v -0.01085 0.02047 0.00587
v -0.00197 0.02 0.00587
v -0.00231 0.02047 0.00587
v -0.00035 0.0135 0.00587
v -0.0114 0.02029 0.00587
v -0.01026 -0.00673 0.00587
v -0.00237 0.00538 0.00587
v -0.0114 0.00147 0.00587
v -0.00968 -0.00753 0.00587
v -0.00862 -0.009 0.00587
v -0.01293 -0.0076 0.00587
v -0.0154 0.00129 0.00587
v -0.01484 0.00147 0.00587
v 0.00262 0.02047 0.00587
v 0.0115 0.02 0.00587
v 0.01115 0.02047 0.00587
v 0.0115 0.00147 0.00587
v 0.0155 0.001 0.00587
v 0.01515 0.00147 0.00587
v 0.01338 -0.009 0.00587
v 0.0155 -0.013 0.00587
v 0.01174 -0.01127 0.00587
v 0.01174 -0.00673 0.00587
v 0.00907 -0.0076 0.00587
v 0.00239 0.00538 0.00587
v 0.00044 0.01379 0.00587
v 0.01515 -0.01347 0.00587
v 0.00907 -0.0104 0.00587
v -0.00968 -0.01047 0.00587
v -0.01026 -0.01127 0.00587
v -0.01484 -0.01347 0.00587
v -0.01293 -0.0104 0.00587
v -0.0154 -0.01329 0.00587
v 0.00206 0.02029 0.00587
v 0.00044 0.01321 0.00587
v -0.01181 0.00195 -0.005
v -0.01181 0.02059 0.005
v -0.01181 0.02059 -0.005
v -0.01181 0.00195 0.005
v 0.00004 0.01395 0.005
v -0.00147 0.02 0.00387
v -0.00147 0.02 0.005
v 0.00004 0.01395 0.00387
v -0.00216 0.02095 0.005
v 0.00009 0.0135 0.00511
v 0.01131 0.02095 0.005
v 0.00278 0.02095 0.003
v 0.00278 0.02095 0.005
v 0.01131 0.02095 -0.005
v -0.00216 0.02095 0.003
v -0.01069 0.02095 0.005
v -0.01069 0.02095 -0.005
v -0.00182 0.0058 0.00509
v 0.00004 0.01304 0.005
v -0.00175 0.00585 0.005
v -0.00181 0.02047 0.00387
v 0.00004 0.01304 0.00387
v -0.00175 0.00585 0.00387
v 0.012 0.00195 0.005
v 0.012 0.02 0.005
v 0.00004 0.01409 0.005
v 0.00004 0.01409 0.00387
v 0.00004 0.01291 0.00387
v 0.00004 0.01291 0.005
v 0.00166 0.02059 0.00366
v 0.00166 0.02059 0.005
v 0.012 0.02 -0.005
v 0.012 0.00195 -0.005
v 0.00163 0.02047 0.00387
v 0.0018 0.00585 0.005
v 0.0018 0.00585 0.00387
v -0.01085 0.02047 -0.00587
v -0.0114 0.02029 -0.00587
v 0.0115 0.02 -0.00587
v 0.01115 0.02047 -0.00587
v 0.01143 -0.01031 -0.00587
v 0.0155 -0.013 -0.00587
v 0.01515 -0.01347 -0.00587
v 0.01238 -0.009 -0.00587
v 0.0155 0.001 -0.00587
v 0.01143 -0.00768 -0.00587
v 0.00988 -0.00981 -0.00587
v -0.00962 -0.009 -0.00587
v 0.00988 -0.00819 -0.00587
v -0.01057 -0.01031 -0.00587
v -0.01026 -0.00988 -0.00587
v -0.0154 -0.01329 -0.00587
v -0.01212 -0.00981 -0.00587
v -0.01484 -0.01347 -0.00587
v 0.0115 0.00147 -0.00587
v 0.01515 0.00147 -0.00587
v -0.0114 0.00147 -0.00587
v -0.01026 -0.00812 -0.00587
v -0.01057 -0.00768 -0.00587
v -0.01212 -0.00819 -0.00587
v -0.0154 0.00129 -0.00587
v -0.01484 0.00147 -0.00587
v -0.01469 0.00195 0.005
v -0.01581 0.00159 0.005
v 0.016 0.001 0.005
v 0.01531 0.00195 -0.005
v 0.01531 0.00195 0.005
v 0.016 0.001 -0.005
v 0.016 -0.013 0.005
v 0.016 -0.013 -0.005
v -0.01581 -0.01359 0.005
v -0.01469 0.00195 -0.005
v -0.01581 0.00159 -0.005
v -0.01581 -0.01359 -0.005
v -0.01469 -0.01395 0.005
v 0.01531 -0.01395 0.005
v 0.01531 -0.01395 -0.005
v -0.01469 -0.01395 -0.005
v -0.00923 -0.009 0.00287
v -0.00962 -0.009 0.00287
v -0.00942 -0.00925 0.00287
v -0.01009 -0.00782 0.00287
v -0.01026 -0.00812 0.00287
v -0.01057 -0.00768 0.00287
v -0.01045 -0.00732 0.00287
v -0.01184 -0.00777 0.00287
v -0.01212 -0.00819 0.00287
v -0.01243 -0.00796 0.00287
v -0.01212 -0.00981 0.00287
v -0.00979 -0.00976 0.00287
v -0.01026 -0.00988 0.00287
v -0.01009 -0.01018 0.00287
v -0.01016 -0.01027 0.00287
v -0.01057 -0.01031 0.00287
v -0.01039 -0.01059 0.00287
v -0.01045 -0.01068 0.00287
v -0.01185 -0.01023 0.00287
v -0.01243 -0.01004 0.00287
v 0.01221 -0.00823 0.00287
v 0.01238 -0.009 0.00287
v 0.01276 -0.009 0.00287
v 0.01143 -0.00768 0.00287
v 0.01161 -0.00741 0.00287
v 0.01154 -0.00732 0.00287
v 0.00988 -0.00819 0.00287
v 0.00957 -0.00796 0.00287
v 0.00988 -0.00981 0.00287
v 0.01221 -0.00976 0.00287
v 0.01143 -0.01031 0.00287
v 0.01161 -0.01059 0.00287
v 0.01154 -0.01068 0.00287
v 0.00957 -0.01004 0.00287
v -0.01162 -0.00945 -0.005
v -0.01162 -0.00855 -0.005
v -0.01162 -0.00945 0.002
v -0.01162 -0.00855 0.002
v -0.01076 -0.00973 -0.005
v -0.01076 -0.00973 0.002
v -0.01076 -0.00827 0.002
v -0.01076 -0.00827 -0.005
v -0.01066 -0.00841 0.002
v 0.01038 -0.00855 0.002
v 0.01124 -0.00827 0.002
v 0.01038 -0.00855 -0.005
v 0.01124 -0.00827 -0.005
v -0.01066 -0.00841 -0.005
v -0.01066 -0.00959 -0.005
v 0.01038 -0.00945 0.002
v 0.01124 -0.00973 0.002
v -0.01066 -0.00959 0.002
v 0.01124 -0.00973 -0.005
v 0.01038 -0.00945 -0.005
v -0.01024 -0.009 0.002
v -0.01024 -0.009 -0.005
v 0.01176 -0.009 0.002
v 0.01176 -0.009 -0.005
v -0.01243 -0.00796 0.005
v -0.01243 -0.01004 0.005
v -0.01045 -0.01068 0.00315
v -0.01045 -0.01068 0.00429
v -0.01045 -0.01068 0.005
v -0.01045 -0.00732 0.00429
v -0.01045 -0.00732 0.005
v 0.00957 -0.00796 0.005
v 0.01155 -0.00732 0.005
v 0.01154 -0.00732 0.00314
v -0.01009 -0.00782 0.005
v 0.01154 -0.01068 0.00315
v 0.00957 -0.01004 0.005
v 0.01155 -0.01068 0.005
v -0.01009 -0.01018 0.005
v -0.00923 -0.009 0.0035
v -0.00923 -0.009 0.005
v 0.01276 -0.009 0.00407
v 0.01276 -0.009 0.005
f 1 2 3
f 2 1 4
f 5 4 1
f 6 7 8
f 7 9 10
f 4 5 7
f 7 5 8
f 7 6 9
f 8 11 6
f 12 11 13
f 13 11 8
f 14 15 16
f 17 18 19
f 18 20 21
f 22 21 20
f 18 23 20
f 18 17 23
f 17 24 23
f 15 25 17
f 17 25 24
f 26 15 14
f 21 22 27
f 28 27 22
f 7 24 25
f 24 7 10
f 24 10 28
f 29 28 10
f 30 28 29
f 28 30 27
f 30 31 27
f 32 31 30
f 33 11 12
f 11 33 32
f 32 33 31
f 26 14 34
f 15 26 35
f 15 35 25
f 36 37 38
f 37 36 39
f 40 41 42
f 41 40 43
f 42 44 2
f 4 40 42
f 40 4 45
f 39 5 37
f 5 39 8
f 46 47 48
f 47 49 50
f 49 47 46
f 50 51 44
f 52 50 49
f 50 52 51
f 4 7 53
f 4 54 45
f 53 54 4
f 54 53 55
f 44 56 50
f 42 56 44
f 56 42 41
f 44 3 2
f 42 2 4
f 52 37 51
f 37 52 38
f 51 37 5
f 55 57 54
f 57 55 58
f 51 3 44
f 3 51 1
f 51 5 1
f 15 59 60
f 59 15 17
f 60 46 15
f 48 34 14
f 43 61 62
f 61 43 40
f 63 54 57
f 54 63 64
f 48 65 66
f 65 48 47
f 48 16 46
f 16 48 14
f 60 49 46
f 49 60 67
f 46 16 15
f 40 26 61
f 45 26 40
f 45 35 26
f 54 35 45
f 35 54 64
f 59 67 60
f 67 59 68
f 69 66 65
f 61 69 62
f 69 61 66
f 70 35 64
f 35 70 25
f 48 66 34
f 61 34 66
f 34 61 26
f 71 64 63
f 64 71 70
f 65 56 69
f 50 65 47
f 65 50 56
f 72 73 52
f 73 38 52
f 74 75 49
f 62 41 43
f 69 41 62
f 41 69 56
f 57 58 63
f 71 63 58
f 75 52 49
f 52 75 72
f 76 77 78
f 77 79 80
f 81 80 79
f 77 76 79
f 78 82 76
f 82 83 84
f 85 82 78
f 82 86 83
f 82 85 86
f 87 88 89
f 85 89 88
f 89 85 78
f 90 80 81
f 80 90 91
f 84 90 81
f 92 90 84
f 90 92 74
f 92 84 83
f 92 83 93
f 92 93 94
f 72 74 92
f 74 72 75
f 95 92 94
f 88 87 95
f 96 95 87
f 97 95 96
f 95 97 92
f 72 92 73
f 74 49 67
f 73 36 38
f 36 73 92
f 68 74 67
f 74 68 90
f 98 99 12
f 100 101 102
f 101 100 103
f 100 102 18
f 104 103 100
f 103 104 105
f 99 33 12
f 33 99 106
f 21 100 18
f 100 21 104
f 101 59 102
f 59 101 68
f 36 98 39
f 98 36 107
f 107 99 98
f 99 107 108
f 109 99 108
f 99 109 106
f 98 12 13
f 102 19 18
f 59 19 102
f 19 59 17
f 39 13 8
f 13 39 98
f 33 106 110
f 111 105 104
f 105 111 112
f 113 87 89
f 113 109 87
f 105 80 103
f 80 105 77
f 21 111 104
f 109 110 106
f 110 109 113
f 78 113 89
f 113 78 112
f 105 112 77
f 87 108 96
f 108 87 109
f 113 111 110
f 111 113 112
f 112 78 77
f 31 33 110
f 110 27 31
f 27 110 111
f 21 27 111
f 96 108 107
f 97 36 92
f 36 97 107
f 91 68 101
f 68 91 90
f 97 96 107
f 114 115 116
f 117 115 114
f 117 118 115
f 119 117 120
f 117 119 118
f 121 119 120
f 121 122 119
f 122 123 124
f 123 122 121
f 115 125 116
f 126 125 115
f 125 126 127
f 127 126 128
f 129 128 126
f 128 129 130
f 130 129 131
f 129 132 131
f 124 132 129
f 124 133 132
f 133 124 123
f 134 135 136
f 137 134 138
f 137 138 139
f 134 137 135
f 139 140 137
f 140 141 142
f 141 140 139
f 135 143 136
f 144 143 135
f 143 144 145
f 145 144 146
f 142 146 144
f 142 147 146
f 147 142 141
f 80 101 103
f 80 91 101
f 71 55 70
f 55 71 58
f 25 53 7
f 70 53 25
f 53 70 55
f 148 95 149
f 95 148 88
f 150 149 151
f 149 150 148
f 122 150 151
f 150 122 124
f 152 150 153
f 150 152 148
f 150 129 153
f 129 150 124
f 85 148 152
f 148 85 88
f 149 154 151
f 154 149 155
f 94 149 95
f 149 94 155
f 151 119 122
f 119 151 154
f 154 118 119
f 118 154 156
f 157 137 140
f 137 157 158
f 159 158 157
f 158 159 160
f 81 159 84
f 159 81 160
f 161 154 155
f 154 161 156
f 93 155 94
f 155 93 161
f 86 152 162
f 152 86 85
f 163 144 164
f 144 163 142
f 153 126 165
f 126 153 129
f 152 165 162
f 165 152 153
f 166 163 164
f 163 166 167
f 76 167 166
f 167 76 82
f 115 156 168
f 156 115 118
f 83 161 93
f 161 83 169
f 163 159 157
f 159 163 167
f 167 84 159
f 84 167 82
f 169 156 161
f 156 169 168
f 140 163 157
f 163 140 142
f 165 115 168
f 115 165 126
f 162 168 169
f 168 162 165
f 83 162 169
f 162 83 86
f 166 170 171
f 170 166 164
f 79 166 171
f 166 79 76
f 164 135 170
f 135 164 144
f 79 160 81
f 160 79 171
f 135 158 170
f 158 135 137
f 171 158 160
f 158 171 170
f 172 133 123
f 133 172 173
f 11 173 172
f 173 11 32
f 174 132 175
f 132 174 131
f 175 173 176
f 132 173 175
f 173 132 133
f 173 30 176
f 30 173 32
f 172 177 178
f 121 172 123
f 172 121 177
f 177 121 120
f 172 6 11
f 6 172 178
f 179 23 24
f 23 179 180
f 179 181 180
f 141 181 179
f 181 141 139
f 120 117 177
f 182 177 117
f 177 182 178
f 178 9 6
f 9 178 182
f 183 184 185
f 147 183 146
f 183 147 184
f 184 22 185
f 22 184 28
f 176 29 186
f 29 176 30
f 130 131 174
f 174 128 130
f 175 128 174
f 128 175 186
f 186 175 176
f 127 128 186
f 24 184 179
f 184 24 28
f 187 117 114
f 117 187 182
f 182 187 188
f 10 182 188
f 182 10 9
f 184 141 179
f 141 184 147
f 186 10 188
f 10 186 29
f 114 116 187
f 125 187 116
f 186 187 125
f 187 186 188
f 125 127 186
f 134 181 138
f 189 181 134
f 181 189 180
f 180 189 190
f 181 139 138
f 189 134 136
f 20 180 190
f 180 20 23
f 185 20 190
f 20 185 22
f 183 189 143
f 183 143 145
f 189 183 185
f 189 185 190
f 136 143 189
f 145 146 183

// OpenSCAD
// Parameters
bbox_x = 0.03; //[0.015:0.06:0.001]
bbox_y = 0.04; //[0.02:0.08:0.001]
bbox_z = 0.01; //[0.005:0.02:0.001]
plate_thk = 0.01; //[0.005:0.02:0.001]
body_w = 0.022; //[0.011:0.044:0.001]
body_l = 0.026; //[0.013:0.052:0.001]
flange_w = 0.03; //[0.015:0.06:0.001]
flange_l = 0.014; //[0.007:0.028:0.001]
chamfer = 0.004; //[0.002:0.008:0.001]
hole_d = 0.004; //[0.002:0.008:0.001]
hole_edge_offset_x = 0.004; //[0.002:0.008:0.001]
hole_edge_offset_y = 0.004; //[0.002:0.008:0.001]
v_depth = 0.001; //[0.0005:0.002:0.0005]
v_len = 0.012; //[0.006:0.024:0.001]
v_w = 0.006; //[0.003:0.012:0.001]
overlap = 0.001; //[0.0005:0.002:0.0005]
countersink_d = 0.006; //[0.003:0.012:0.001]
countersink_depth = 0.002; //[0.001:0.004:0.0005]
fillet_r = 0.001; //[0.0005:0.002:0.0005]

// Base Shapes
module plate_body_main() {
  translate([0, flange_l/2, 0])
    cube([body_w, body_l, plate_thk], center=true);
}

module plate_body_flange() {
  translate([0, -body_l/2 + flange_l/2, 0])
    cube([flange_w, flange_l, plate_thk], center=true);
}

module chamfer_wedge_left() {
  translate([-body_w/2 + chamfer/2, flange_l + body_l/2 - chamfer/2, 0])
    rotate([0, 0, 45])
      cube([chamfer, chamfer, plate_thk + 2*overlap], center=true);
}

module chamfer_wedge_right() {
  translate([body_w/2 - chamfer/2, flange_l + body_l/2 - chamfer/2, 0])
    rotate([0, 0, 45])
      cube([chamfer, chamfer, plate_thk + 2*overlap], center=true);
}

module through_hole_1() {
  translate([-flange_w/2 + hole_edge_offset_x, -body_l/2 + hole_edge_offset_y, 0])
    cylinder(h=plate_thk + 2*overlap, r=hole_d/2, center=true);
}

module through_hole_2() {
  translate([flange_w/2 - hole_edge_offset_x, -body_l/2 + hole_edge_offset_y, 0])
    cylinder(h=plate_thk + 2*overlap, r=hole_d/2, center=true);
}

module counterbore_1() {
  translate([-flange_w/2 + hole_edge_offset_x, -body_l/2 + hole_edge_offset_y, plate_thk/2 - (countersink_depth + overlap)/2])
    cylinder(h=countersink_depth + overlap, r=countersink_d/2, center=true);
}

module counterbore_2() {
  translate([flange_w/2 - hole_edge_offset_x, -body_l/2 + hole_edge_offset_y, plate_thk/2 - (countersink_depth + overlap)/2])
    cylinder(h=countersink_depth + overlap, r=countersink_d/2, center=true);
}

module v_arrow_face_feature_1() {
  translate([0, flange_l/2 + body_l*0.15, plate_thk/2 - (v_depth + overlap)/2])
    linear_extrude(height=v_depth + overlap, center=true)
      polygon(points=[[-v_w/2, -v_len/2], [v_w/2, -v_len/2], [0, v_len/2]]);
}

module v_arrow_face_feature_2() {
  translate([0, flange_l/2 + body_l*0.35, plate_thk/2 - (v_depth + overlap)/2])
    rotate([0, 0, 180])
      linear_extrude(height=v_depth + overlap, center=true)
        polygon(points=[[-v_w/2, -v_len/2], [v_w/2, -v_len/2], [0, v_len/2]]);
}

module edge_fillet_sphere() {
  sphere(r=fillet_r, center=true);
}

// Operations
module plate_body_with_stepped_flange() {
  union() {
    plate_body_main();
    plate_body_flange();
  }
}

module chamfered_end_corners() {
  difference() {
    plate_body_with_stepped_flange();
    chamfer_wedge_left();
    chamfer_wedge_right();
  }
}

module holes_and_counterbores() {
  difference() {
    chamfered_end_corners();
    through_hole_1();
    through_hole_2();
    counterbore_1();
    counterbore_2();
  }
}

module face_v_features_recessed() {
  difference() {
    holes_and_counterbores();
    v_arrow_face_feature_1();
    v_arrow_face_feature_2();
  }
}

module edge_fillets() {
  minkowski() {
    face_v_features_recessed();
    edge_fillet_sphere();
  }
}

// Final Output
edge_fillets();
